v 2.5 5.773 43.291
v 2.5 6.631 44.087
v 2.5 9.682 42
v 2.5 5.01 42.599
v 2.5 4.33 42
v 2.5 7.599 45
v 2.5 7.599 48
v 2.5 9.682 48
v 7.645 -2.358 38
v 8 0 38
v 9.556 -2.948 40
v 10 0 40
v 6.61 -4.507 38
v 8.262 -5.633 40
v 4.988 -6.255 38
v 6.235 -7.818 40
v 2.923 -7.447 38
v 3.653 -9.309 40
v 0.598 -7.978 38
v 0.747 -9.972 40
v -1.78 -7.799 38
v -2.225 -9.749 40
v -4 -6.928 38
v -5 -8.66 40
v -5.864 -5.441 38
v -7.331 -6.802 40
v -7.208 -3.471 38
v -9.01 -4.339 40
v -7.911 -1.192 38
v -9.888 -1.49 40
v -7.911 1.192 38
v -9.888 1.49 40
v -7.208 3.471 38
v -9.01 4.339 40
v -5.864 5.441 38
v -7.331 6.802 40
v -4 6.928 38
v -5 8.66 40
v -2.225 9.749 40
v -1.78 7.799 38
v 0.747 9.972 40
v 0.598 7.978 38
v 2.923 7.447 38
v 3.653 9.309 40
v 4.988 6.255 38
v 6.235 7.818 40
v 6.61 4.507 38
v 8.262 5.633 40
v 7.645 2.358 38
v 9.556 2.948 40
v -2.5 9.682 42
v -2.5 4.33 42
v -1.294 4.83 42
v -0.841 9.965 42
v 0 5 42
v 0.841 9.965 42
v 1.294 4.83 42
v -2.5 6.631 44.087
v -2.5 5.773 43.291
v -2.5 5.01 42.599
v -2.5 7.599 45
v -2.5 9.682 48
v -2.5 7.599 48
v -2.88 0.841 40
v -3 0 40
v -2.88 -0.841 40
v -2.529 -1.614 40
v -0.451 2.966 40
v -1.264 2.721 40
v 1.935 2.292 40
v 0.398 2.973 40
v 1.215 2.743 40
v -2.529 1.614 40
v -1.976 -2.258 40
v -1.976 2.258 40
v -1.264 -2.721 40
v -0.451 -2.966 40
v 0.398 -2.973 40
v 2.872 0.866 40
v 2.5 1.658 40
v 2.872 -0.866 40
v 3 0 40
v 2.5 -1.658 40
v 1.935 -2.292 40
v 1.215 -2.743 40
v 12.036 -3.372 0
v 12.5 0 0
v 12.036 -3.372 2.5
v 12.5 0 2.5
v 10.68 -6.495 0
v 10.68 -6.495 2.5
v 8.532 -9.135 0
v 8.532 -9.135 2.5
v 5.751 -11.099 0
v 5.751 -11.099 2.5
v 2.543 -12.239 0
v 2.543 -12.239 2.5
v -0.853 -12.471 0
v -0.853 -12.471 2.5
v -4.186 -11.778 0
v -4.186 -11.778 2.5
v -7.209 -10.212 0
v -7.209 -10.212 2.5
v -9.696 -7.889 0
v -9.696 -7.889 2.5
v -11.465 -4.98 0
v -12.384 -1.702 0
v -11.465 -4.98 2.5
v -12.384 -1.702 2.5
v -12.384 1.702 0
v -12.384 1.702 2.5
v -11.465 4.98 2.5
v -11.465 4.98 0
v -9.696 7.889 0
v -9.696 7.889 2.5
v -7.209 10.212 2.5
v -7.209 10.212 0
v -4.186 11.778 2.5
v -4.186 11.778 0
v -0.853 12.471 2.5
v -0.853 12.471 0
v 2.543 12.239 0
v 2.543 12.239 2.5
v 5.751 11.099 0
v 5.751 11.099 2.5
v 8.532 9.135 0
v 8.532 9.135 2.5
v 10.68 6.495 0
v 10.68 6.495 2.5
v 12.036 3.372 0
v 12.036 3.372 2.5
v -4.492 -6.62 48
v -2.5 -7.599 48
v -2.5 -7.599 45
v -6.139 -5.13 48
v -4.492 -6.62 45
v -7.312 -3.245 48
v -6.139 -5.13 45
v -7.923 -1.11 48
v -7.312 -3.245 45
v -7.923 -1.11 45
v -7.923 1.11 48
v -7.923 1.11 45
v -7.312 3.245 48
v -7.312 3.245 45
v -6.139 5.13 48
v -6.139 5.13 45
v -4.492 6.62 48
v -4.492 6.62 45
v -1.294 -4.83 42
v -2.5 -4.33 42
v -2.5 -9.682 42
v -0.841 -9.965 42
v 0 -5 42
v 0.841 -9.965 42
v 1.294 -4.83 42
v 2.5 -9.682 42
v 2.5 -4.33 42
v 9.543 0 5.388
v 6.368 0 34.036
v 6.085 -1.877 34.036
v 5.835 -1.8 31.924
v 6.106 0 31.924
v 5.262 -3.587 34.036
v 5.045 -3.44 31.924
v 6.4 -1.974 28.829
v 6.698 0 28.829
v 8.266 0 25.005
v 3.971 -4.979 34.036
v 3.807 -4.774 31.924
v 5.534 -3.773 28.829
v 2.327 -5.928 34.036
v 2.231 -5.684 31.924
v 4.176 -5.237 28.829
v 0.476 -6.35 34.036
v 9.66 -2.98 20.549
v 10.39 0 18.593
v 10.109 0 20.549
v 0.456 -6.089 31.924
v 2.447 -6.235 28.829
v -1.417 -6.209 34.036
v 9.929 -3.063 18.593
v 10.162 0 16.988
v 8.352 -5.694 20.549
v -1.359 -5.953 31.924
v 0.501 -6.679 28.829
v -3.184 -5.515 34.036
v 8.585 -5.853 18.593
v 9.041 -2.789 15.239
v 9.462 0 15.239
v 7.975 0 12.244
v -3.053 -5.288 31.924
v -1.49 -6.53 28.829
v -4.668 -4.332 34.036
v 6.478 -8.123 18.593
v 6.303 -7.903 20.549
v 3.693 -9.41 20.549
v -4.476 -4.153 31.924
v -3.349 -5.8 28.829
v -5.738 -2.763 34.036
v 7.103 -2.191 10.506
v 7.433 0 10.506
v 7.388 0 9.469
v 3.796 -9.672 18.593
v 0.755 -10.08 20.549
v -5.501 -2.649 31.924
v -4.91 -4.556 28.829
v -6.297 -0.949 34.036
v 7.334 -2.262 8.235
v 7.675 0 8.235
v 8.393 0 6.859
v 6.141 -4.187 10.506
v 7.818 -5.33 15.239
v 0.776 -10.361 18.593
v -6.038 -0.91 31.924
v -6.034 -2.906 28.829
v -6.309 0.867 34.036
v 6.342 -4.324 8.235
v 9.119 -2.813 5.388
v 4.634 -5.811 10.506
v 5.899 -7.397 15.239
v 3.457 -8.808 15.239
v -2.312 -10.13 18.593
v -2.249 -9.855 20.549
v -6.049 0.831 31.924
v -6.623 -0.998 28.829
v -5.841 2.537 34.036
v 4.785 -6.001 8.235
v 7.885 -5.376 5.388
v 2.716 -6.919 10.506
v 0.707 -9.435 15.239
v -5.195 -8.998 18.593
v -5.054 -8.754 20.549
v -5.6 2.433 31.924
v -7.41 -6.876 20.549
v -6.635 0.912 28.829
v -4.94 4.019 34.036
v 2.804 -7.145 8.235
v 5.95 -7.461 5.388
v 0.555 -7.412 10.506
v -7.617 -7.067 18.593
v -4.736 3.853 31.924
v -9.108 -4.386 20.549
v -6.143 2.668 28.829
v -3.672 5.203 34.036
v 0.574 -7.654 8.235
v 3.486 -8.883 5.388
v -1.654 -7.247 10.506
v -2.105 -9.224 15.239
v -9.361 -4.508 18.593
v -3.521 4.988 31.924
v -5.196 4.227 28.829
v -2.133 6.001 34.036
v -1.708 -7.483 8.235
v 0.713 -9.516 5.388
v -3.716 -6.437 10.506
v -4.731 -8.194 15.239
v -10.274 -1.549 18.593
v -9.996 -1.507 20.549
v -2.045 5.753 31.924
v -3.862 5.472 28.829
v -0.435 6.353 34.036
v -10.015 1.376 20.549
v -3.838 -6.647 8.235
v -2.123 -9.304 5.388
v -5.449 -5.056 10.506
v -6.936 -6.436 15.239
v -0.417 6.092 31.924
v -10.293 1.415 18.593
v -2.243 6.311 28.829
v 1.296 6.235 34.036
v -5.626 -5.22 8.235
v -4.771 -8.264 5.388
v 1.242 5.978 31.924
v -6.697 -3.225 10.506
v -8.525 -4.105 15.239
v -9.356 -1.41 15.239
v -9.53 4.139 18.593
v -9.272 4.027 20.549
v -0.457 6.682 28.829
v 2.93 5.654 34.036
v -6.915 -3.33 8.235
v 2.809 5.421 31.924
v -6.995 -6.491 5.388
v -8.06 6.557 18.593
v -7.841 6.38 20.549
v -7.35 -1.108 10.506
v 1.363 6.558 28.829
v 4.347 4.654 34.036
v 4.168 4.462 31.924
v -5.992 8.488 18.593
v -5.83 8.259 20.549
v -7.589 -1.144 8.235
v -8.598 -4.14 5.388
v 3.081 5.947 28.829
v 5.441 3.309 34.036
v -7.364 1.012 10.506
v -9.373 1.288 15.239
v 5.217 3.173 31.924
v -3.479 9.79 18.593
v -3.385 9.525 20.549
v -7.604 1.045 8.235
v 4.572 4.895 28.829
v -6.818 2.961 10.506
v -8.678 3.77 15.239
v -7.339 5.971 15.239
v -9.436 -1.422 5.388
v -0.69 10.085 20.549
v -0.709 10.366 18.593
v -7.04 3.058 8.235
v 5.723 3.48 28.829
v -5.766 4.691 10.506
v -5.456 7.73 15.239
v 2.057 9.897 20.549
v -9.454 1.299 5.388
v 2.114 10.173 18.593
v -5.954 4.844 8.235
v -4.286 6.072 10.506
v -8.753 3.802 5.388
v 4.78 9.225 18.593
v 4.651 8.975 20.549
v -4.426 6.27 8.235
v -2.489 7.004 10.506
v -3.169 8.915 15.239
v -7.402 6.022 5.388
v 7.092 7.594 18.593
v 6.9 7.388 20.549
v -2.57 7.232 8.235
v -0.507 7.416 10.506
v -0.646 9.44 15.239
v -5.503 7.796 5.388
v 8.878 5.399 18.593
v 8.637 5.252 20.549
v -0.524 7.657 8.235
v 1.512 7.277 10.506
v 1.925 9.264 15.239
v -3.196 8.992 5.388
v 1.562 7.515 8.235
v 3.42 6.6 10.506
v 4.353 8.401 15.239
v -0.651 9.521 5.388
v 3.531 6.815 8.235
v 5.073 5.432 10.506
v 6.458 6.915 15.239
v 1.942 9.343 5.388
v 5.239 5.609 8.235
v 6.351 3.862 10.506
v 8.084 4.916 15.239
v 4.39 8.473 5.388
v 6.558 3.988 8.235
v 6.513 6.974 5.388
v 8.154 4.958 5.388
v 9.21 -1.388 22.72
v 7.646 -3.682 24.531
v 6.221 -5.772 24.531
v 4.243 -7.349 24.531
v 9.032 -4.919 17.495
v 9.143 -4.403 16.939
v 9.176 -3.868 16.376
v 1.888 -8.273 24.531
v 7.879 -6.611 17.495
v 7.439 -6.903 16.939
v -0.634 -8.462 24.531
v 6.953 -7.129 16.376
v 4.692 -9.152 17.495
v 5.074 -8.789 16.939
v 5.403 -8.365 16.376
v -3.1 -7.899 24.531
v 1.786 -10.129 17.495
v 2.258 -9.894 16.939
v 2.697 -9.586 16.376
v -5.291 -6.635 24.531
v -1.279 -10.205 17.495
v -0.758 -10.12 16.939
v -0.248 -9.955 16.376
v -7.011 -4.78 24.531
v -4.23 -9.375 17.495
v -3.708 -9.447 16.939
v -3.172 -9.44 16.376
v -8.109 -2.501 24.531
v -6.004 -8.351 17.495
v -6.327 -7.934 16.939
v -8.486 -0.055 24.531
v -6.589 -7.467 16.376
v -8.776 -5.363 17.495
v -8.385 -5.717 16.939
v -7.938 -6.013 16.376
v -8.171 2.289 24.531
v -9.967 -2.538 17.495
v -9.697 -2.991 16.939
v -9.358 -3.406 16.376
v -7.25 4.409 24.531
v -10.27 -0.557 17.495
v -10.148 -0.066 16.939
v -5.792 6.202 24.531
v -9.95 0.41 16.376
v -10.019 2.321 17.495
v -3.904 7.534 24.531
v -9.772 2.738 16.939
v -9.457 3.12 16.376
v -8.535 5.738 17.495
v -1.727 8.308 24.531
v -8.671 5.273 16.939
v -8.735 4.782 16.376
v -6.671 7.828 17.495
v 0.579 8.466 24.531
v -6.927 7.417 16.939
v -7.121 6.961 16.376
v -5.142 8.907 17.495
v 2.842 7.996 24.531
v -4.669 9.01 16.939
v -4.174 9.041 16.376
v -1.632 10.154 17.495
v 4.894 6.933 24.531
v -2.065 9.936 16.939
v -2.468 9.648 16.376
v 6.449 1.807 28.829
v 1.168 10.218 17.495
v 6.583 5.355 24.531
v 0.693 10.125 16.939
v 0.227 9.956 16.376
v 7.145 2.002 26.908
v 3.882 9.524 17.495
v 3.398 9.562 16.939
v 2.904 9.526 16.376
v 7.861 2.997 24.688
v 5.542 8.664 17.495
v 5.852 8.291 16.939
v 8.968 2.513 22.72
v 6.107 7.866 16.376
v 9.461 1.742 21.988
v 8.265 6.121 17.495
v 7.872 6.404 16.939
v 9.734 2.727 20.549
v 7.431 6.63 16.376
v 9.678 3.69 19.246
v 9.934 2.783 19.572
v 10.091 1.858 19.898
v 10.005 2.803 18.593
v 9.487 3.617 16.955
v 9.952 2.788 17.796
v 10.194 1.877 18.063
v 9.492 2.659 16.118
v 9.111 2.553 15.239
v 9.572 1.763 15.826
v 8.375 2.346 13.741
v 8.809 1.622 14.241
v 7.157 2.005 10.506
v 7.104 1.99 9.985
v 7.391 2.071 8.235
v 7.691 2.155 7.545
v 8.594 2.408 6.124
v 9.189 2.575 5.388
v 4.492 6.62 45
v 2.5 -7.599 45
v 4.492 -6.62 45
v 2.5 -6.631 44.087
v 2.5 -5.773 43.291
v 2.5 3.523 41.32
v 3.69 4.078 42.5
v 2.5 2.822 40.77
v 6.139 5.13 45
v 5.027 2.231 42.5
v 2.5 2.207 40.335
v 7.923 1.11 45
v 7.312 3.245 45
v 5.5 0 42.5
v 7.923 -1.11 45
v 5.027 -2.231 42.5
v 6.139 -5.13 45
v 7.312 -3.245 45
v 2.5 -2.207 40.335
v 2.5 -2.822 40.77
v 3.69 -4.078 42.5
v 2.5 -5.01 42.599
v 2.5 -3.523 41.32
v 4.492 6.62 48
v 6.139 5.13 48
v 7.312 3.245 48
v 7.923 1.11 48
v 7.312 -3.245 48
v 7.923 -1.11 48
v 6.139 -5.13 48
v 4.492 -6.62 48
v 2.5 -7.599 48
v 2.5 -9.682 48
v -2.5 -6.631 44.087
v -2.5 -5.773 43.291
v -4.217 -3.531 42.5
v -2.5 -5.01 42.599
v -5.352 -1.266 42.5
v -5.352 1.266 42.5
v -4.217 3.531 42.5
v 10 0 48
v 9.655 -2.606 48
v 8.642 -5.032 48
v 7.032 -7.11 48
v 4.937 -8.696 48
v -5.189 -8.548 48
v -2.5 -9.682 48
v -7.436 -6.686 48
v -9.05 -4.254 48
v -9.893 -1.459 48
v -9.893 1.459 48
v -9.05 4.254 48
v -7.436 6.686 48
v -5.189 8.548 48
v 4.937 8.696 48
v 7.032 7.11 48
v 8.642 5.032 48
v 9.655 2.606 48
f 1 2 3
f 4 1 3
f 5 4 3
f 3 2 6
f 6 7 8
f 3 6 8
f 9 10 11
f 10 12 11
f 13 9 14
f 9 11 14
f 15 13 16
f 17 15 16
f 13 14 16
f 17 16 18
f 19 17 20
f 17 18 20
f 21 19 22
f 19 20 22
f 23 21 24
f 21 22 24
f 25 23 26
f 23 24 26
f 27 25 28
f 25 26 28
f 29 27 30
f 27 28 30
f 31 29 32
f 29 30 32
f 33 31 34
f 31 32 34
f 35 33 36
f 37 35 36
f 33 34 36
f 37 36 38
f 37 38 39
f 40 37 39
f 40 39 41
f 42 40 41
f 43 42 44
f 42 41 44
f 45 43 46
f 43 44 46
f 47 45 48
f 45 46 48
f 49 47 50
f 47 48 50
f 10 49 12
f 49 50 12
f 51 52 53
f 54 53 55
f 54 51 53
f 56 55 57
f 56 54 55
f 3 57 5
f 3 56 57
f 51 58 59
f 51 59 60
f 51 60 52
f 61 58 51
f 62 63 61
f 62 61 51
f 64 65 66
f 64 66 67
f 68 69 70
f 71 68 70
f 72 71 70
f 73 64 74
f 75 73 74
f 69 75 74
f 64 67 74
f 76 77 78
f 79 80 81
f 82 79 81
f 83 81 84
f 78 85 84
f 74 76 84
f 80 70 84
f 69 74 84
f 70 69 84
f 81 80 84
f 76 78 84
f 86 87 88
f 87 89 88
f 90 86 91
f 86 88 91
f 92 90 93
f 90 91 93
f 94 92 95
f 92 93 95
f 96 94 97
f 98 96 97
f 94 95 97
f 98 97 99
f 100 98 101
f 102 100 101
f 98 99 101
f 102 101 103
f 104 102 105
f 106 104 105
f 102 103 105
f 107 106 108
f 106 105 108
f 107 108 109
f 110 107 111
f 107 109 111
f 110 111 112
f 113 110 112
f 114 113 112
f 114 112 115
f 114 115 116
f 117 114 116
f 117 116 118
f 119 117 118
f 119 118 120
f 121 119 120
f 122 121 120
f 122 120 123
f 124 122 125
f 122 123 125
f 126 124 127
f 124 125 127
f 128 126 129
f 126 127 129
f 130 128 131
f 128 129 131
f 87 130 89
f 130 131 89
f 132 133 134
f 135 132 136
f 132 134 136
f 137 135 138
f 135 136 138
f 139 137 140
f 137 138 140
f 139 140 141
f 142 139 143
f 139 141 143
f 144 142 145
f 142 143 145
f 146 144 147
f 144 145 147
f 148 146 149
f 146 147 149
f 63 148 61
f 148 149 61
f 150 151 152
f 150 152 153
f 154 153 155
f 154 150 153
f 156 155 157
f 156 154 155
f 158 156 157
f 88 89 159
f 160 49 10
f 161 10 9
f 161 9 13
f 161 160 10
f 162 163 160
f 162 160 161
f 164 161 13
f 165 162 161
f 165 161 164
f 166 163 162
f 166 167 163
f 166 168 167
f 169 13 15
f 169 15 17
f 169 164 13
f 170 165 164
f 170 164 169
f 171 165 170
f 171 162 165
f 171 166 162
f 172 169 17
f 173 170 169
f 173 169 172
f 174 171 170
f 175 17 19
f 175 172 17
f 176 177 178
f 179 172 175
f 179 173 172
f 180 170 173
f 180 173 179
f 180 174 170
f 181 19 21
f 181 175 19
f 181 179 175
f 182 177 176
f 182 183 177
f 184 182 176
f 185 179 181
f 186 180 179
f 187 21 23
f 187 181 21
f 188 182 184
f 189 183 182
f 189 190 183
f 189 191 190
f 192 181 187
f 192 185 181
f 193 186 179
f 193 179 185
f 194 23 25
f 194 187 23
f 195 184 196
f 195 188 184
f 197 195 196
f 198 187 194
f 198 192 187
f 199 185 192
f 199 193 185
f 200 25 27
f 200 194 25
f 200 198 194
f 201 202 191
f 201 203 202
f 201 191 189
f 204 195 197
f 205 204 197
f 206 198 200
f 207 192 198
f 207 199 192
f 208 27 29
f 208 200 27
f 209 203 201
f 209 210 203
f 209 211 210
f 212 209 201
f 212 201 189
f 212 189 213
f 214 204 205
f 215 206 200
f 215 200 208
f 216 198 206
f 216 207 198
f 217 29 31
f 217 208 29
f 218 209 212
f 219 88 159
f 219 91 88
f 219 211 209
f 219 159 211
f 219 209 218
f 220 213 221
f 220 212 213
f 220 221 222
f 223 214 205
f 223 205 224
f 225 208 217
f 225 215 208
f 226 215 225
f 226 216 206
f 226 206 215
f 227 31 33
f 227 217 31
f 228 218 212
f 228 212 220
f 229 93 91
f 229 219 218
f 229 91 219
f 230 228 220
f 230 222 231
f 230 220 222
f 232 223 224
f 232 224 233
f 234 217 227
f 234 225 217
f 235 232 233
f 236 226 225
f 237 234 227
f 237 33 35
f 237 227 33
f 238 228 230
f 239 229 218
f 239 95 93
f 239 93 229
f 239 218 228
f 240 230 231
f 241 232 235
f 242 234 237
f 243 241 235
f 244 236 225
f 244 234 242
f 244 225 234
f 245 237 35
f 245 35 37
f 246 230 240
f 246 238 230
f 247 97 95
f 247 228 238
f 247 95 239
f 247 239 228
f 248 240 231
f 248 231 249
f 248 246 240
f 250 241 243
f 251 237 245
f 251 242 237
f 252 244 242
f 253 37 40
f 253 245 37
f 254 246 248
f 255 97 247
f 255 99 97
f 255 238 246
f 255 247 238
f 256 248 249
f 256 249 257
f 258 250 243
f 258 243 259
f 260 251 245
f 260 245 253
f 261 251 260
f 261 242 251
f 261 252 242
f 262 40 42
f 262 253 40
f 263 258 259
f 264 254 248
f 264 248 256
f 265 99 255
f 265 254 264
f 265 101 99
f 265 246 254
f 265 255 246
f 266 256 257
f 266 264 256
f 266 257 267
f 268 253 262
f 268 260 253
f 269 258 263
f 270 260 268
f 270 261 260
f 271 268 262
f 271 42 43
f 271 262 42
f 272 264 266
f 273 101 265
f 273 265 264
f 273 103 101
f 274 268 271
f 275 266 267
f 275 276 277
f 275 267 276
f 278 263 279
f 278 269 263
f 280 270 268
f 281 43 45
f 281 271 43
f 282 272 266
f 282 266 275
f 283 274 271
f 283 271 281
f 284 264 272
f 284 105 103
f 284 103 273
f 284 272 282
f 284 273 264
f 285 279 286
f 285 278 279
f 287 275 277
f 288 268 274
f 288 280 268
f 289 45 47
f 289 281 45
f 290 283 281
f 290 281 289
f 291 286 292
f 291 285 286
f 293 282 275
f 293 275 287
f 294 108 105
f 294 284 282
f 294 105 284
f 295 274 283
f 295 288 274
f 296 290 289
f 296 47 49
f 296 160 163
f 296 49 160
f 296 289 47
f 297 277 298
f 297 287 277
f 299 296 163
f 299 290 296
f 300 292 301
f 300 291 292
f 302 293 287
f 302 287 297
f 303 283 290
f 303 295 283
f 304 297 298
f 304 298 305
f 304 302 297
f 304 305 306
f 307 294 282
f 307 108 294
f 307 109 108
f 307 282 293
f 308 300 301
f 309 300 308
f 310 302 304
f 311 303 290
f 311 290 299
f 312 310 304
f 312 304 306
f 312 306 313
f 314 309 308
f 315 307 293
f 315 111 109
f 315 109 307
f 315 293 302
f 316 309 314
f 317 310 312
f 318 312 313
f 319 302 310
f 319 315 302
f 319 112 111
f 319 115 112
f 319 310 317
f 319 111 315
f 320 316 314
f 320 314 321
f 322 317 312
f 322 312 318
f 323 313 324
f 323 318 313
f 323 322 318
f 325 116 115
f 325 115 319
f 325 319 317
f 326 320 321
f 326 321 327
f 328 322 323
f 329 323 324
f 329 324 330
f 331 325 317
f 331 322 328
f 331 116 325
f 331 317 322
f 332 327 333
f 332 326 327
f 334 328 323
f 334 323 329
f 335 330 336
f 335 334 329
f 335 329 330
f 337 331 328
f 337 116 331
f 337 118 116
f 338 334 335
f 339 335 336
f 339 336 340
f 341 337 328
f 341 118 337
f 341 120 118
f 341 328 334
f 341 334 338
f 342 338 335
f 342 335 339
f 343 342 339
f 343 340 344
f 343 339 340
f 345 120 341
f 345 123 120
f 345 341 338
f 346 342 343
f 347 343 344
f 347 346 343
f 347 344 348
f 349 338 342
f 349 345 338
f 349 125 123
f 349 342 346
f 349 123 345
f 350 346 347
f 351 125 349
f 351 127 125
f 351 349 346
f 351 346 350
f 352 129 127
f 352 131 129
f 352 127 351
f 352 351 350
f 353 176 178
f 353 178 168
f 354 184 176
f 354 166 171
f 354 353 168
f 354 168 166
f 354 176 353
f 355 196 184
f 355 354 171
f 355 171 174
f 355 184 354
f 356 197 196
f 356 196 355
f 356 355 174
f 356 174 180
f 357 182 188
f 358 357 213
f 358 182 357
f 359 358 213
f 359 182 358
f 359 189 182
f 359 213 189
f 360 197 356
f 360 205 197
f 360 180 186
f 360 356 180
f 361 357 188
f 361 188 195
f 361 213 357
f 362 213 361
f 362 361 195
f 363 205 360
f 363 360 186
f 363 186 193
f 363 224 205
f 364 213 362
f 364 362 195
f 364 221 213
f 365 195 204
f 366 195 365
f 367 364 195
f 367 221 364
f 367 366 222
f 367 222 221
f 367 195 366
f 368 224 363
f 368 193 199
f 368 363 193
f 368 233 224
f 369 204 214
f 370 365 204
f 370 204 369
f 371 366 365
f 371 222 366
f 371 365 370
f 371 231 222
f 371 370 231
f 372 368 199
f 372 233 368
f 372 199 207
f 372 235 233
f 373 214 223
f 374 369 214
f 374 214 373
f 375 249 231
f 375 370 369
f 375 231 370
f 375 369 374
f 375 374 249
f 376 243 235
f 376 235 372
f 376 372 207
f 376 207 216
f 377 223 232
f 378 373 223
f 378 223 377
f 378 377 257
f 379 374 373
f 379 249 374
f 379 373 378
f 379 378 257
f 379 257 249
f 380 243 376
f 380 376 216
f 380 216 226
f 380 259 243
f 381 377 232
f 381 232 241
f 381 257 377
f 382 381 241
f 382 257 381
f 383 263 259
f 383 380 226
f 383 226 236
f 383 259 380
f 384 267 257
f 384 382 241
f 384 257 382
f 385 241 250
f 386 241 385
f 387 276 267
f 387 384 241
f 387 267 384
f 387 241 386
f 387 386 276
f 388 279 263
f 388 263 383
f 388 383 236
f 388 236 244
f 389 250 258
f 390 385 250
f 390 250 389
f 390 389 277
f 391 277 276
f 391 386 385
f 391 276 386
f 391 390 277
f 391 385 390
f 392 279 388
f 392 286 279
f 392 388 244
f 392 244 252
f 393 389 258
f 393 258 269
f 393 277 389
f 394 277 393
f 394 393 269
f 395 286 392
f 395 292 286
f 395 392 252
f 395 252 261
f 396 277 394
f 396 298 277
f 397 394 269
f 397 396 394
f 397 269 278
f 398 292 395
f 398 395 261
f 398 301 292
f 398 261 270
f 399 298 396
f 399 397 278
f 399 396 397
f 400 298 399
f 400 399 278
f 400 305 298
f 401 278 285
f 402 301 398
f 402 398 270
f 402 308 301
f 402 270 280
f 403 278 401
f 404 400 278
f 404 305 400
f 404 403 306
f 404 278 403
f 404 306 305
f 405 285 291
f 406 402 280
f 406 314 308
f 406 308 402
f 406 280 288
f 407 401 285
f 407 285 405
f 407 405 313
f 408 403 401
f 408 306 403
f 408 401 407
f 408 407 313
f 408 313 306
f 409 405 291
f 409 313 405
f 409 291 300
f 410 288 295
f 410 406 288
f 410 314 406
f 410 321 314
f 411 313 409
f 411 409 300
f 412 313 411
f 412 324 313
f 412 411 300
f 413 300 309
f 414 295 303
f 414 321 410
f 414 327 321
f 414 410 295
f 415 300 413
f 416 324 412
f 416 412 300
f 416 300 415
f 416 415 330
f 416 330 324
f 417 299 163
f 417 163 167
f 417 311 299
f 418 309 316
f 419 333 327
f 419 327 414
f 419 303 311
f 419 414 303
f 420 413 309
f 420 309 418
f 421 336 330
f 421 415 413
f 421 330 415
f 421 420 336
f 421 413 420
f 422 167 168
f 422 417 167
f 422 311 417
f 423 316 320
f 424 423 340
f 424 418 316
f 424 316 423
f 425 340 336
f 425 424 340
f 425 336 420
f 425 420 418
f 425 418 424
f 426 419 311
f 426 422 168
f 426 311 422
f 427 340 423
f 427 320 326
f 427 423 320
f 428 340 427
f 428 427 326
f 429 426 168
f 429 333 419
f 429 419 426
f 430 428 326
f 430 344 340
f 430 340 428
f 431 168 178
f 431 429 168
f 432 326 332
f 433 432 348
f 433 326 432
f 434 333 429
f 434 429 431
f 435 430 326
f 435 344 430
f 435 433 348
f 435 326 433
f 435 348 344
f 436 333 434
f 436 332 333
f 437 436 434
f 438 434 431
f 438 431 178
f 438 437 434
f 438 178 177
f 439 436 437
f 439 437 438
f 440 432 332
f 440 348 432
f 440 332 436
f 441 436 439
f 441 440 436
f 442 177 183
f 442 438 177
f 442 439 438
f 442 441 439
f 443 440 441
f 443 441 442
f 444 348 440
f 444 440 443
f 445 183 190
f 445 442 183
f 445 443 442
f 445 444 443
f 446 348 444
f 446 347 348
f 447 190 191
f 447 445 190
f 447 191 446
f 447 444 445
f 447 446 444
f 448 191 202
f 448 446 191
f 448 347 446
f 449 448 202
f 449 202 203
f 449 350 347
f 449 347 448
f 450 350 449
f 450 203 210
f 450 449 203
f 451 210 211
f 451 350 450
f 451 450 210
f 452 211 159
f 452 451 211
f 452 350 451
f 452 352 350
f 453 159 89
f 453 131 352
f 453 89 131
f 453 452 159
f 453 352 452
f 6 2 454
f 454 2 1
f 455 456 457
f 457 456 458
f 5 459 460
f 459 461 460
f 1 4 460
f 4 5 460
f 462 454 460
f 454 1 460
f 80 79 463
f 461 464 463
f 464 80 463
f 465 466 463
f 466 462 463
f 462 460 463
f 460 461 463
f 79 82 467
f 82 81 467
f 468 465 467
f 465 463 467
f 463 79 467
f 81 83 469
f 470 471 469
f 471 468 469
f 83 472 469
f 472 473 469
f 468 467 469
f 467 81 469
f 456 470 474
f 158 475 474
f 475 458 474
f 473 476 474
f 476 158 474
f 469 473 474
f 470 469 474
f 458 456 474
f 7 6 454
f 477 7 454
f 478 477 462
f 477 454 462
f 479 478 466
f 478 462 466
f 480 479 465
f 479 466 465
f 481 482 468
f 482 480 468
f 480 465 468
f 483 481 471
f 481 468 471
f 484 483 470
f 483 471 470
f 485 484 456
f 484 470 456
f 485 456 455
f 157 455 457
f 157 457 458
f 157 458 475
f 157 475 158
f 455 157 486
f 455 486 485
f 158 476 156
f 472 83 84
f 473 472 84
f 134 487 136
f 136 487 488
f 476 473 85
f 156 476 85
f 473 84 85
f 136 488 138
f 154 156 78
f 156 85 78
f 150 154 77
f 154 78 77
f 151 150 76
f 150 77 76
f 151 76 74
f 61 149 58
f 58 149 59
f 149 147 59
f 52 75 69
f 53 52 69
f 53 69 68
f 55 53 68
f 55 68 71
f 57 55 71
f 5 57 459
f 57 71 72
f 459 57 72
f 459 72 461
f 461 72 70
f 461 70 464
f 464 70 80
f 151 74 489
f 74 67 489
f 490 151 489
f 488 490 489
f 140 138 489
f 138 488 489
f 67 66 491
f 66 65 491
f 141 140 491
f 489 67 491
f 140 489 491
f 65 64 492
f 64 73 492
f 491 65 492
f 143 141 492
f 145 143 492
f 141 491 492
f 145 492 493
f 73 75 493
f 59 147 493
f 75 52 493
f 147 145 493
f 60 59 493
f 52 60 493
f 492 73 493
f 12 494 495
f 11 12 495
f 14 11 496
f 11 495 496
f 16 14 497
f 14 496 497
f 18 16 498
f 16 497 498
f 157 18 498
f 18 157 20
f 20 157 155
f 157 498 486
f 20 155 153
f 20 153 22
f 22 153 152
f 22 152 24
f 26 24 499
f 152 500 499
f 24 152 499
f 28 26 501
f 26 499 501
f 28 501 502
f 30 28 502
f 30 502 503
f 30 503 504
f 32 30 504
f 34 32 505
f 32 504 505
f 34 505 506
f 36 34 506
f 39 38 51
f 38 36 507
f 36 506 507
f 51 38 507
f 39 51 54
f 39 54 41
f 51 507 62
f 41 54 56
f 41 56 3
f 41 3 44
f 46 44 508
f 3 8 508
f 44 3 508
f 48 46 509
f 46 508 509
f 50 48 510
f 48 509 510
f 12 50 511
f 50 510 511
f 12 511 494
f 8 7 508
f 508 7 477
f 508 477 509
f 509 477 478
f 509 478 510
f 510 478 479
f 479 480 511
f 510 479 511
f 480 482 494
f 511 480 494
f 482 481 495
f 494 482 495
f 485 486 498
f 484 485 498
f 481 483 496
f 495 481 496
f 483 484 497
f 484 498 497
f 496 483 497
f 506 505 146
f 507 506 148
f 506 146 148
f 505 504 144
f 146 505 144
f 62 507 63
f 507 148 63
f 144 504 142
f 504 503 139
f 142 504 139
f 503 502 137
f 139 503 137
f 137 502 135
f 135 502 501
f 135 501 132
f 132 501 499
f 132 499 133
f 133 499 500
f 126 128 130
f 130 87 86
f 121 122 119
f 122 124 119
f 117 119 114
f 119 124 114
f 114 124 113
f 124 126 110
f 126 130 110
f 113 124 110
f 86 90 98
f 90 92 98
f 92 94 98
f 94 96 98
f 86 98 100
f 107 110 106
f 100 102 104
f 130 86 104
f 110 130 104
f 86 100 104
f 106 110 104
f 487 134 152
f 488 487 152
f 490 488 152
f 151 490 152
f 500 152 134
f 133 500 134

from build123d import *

# Parameters (mm, degrees)
F0_W     = 12.5
F0_H     = 2.5
F2_W     = 5
F2_H     = 30
F3_DEPTH = 6


# Not quite as in the source:
# - a fillet or chamfer that OpenCascade refuses, or shapes differently, is made with other operations: its cross-section is extruded or revolved along the edge and cut away or added


with BuildPart() as f1:
    # F0 (on Front) → F1 (revolve)
    with BuildSketch(Plane.XZ):
        with BuildLine():
            Line((0, 2.5), (12.5, 2.5))
            add(Edge.make_bspline(
                [(8, 38), (7.0575290046, 36.0296102259), (4.9176459622, 31.9169764445), (8.8571855748, 23.8819266131), (11.7311727266, 17.2522437772), (5.0634432181, 9.5532988579), (9.6973287885, 5.0417102196), (12.5, 2.5)],
                knots=[0, 0, 0, 0, 0.1821407595, 0.3923850866, 0.5803644457, 0.7831417696, 1, 1, 1, 1], degree=3))
            Line((8, 38), (0, 38))
            Line((0, 38), (0, 2.5))
        make_face()
        with Locations((6.25, 1.25)):
            Rectangle(F0_W, F0_H)
        Polygon((10, 40), (10, 48), (8, 48), (8, 40), (0, 40), (0, 38), (8, 38), align=None)
    revolve(axis=Axis((0, 0, 44), (0, 0, -1)))

    # F2 (on face) → F3 (cut)
    with BuildSketch(Plane.XY.offset(48)):
        Rectangle(F2_W, F2_H)
    extrude(amount=-F3_DEPTH, mode=Mode.SUBTRACT)

    # F4: chamfer of 5 on 1 edges, made by hand


with BuildPart() as f4_tool2:
    # F4_s3 → F4_t4 (revolve)
    with BuildSketch(Plane.XZ):
        Polygon((8, 45), (3, 40), (8, 40), align=None)
    revolve(axis=Axis((0, 0, 40), (0, 0, -1)))

    split(bisect_by=Plane.YZ.offset(2.5), keep=Keep.TOP)


with BuildPart() as f1_1:
    add(f1.part)

    # F4_t1: union F4_tool2
    add(f4_tool2.part)


with BuildPart() as f4_tool7:
    # F4_s8 → F4_t9 (revolve)
    with BuildSketch(Plane.XZ):
        Polygon((8, 45), (3, 40), (8, 40), align=None)
    revolve(axis=Axis((0, 0, 40), (0, 0, -1)))

    split(bisect_by=Plane.XY.offset(42), keep=Keep.BOTTOM)


with BuildPart() as f1_2:
    add(f1_1.part)

    # F4_t6: union F4_tool7
    add(f4_tool7.part)


with BuildPart() as f4_tool12:
    # F4_s13 → F4_t14 (revolve)
    with BuildSketch(Plane.XZ):
        Polygon((8, 45), (3, 40), (8, 40), align=None)
    revolve(axis=Axis((0, 0, 40), (0, 0, -1)))

    split(bisect_by=Plane.YZ.offset(-2.5), keep=Keep.BOTTOM)


with BuildPart() as f1_3:
    add(f1_2.part)

    # F4_t11: union F4_tool12
    add(f4_tool12.part)


solid = f1_3.part
